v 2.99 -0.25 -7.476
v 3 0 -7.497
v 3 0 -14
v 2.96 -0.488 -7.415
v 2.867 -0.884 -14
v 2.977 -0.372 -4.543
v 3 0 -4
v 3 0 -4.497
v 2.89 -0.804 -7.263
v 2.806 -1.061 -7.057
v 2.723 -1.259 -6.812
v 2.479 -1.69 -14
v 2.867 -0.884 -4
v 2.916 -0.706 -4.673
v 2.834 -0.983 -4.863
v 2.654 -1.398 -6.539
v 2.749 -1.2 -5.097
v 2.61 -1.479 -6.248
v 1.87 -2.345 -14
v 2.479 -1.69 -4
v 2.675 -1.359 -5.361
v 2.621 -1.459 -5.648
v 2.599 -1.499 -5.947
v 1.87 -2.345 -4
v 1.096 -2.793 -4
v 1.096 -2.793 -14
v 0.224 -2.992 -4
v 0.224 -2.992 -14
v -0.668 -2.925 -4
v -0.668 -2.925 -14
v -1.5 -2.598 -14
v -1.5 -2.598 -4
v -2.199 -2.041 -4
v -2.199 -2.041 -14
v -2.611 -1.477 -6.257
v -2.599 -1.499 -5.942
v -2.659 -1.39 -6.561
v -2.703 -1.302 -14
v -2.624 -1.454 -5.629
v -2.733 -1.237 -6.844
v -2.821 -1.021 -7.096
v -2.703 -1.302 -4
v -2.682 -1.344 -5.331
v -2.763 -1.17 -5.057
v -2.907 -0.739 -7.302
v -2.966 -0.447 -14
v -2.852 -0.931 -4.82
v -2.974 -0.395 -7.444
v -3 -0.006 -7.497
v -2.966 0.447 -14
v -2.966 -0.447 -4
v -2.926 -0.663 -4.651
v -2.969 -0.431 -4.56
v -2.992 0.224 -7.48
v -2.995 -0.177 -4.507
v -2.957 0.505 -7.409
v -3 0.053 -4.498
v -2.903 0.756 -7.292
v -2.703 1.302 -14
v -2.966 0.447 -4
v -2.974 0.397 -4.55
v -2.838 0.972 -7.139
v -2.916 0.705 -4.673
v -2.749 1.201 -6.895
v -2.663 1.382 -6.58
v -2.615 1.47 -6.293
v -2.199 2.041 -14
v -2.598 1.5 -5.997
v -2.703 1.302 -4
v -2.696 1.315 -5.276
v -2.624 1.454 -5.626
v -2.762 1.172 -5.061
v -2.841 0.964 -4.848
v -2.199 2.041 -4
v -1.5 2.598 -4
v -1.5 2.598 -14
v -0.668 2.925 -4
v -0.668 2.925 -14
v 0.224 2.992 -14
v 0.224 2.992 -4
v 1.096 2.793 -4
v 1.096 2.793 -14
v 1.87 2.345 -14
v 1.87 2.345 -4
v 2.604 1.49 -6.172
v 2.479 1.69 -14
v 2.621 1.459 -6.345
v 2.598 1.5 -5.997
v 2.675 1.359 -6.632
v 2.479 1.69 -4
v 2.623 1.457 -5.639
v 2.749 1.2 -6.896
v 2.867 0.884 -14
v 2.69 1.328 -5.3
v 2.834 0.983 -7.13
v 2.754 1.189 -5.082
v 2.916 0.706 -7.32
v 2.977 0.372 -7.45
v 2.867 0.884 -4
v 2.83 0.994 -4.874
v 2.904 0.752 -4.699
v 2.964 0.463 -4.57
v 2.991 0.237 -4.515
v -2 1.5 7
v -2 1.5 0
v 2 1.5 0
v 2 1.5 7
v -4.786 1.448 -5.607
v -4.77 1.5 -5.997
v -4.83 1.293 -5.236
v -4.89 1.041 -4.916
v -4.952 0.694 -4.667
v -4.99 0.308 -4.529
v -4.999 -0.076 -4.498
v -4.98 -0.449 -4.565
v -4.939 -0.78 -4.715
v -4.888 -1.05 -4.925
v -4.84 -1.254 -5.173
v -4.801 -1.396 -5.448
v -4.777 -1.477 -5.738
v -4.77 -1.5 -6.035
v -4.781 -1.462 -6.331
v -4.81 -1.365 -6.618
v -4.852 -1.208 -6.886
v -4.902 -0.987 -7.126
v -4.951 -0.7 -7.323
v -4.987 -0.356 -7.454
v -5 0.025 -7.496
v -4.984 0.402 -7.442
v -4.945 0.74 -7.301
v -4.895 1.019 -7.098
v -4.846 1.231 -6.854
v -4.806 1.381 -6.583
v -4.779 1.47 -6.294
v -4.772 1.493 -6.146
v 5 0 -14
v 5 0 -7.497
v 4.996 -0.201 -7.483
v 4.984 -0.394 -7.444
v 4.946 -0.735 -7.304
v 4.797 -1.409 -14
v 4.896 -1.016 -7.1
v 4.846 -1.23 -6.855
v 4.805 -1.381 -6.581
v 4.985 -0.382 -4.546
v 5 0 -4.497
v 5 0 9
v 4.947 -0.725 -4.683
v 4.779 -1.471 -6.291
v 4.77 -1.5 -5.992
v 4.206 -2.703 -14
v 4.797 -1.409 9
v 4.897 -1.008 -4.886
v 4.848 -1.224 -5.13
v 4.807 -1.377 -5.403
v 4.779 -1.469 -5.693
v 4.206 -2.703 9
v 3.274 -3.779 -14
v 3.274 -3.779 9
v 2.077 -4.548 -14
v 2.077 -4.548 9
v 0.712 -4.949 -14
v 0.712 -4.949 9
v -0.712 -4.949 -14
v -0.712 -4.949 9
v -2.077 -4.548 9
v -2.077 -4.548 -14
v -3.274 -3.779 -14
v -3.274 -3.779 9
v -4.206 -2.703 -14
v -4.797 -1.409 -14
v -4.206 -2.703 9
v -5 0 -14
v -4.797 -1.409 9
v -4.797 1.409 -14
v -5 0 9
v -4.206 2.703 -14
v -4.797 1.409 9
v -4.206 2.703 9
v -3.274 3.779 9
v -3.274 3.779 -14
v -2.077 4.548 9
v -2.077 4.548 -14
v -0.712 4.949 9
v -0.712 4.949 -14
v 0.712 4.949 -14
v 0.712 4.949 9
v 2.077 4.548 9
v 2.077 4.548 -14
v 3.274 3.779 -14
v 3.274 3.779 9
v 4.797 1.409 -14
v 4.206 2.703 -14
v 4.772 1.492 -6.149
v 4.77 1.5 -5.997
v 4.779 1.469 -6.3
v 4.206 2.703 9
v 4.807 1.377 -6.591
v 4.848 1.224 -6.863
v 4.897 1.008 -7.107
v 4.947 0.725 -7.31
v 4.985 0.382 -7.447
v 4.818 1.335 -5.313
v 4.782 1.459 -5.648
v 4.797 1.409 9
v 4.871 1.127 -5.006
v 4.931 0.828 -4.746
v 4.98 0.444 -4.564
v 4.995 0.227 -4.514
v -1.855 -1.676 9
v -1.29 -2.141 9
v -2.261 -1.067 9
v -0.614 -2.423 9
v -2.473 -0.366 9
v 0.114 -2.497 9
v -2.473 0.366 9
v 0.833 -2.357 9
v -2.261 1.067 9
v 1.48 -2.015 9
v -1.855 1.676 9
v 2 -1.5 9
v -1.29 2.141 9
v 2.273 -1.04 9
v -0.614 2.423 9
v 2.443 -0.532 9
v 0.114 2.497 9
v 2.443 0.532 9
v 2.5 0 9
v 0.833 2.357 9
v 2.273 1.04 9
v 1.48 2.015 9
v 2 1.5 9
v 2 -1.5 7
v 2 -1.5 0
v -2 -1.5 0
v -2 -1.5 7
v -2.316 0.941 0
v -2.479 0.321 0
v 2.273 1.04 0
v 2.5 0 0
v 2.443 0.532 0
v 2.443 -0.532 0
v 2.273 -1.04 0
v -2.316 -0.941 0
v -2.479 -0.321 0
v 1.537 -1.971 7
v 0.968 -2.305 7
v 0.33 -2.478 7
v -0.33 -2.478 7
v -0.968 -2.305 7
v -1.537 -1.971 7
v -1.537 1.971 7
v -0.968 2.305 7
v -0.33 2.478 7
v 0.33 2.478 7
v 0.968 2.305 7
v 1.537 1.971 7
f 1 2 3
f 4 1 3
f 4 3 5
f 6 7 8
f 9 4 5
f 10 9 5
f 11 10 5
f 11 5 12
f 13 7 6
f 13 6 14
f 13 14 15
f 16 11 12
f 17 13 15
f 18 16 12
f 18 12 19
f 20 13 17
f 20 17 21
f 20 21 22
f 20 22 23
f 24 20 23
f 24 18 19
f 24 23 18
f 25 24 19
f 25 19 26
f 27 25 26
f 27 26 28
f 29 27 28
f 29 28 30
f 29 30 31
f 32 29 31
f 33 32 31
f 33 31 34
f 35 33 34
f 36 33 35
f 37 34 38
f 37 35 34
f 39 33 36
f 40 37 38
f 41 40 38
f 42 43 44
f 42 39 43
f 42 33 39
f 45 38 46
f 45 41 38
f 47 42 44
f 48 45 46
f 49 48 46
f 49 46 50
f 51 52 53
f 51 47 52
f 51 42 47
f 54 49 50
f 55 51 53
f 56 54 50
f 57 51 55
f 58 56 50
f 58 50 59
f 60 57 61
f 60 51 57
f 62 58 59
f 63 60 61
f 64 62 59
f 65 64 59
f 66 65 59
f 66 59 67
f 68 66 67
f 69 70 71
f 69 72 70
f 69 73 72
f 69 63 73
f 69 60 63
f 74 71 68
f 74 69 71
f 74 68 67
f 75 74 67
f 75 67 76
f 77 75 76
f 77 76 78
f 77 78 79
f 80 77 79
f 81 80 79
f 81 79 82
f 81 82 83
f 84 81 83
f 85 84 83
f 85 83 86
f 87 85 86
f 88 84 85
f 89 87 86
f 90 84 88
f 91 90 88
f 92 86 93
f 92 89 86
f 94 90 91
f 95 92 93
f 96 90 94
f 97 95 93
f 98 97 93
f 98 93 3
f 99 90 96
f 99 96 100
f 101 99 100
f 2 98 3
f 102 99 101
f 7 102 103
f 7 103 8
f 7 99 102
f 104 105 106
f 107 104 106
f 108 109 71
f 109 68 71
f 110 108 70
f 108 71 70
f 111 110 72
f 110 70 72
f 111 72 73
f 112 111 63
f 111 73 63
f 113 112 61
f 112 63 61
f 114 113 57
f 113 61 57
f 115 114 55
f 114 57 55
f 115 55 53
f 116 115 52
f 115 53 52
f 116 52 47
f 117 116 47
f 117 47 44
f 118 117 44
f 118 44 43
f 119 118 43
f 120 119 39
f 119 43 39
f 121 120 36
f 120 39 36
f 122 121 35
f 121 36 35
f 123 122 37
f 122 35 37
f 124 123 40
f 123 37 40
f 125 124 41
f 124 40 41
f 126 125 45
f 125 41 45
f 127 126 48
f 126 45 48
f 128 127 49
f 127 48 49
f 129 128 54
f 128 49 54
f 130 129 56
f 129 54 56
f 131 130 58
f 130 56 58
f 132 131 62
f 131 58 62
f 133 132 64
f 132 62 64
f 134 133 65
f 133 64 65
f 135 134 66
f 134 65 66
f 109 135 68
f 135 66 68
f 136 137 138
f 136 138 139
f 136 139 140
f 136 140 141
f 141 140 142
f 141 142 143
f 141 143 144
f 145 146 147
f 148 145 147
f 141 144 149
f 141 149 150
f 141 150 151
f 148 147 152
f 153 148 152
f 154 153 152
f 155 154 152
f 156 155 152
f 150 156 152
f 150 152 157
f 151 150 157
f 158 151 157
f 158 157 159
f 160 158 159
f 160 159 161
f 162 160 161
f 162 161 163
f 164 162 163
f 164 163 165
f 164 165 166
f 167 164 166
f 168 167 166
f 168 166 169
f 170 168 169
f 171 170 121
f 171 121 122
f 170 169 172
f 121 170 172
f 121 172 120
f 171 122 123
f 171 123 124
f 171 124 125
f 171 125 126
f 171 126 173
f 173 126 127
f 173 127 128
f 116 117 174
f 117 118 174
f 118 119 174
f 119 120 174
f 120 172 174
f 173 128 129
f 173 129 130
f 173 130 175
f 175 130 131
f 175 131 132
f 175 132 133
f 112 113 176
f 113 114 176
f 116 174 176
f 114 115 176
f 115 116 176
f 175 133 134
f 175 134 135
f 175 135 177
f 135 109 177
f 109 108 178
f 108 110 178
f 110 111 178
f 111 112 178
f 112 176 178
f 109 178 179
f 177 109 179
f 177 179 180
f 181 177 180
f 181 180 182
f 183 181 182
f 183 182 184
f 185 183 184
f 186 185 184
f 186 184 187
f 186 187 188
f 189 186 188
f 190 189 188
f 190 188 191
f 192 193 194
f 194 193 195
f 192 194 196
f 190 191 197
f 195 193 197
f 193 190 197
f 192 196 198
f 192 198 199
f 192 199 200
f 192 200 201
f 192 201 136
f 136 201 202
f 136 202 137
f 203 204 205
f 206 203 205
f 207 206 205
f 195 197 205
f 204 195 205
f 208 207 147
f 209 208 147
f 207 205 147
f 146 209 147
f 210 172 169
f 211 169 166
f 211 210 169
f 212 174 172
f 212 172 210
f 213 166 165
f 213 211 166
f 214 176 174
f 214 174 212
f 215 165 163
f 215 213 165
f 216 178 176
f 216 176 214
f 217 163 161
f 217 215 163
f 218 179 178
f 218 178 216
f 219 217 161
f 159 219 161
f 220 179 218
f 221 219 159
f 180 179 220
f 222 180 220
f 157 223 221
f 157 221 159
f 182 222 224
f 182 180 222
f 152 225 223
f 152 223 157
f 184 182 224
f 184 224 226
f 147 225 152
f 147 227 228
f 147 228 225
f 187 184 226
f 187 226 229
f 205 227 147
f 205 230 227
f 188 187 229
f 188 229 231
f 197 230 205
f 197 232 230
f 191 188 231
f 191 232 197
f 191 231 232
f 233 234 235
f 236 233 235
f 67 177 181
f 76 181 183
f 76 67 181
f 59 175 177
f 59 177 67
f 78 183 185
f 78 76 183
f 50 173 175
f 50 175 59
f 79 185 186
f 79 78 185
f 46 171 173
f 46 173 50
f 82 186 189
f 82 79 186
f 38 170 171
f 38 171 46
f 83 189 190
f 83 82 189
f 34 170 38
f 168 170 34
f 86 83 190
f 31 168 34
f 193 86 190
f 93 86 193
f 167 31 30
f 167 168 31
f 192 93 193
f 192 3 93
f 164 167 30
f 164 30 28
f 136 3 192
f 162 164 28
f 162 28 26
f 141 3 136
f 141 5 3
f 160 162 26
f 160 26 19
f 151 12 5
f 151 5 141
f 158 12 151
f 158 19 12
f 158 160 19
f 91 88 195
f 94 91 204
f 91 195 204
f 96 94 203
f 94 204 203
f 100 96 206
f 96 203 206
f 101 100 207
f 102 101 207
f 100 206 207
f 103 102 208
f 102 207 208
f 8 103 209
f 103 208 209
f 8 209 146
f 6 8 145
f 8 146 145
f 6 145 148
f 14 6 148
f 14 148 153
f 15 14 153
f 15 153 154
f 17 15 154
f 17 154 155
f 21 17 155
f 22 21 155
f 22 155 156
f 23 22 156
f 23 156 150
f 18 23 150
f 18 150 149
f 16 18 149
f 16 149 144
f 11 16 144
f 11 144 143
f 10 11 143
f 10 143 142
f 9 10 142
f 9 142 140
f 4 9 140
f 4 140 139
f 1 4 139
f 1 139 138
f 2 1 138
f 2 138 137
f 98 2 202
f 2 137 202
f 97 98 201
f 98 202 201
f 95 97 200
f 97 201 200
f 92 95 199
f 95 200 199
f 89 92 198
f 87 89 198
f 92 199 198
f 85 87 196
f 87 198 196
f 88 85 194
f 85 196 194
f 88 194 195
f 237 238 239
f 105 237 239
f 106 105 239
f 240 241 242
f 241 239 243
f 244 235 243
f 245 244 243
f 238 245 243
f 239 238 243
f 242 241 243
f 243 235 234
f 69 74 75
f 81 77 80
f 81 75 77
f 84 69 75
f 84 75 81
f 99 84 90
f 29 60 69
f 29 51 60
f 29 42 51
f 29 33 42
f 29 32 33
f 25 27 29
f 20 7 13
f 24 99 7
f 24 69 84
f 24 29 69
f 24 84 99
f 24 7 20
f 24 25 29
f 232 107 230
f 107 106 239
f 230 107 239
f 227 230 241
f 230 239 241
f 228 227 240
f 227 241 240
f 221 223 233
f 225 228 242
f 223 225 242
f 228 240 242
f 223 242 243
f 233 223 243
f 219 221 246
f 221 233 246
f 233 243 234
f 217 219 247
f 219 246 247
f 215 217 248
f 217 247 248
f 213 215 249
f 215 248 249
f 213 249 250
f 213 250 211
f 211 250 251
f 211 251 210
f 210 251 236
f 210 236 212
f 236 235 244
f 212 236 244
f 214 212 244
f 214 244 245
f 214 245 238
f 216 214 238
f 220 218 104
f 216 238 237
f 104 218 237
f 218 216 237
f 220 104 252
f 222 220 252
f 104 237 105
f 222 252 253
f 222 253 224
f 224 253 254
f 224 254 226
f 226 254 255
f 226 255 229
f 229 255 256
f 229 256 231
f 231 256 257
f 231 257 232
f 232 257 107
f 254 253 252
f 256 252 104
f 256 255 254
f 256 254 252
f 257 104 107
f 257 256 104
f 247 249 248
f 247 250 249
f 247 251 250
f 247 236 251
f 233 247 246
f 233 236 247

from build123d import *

# Parameters (mm, degrees)
F0_R     = 5
F1_DEPTH = 7
F2_DEPTH = 9
F3_R     = 5
F3_R_2   = 3
F4_DEPTH = 4
F5_DEPTH = 14
F6_R     = 1.5
F7_DEPTH = 12.5


with BuildPart() as f1:
    # F0 (on Top) → F1 (new body)
    with BuildSketch(Plane.XY):
        Circle(F0_R)
        with BuildLine():
            ThreePointArc((-2, 1.5), (0, 2.5), (2, 1.5))
            Line((2, 1.5), (3.6073317751, 1.5))
            Line((3.6073317751, 1.5), (3.6073317751, -1.5))
            Line((3.6073317751, -1.5), (2, -1.5))
            ThreePointArc((2, -1.5), (0, -2.5), (-2, -1.5))
            Line((-2, -1.5), (-3.6073317751, -1.5))
            Line((-3.6073317751, -1.5), (-3.6073317751, 1.5))
            Line((-3.6073317751, 1.5), (-2, 1.5))
        make_face(mode=Mode.SUBTRACT)
        with BuildLine():
            ThreePointArc((2, 1.5), (2.3717082451, 0.790569415), (2.5, 0))
            ThreePointArc((2.5, 0), (2.3717082451, -0.790569415), (2, -1.5))
            Line((2, -1.5), (3.6073317751, -1.5))
            Line((3.6073317751, -1.5), (3.6073317751, 1.5))
            Line((3.6073317751, 1.5), (2, 1.5))
        make_face()
        with BuildLine():
            Line((-2, 1.5), (2, 1.5))
            ThreePointArc((2, 1.5), (0, 2.5), (-2, 1.5))
        make_face()
        with BuildLine():
            ThreePointArc((-2, -1.5), (0, -2.5), (2, -1.5))
            Line((2, -1.5), (-2, -1.5))
        make_face()
        with BuildLine():
            ThreePointArc((-2, -1.5), (-2.5, 0), (-2, 1.5))
            Line((-2, 1.5), (-3.6073317751, 1.5))
            Line((-3.6073317751, 1.5), (-3.6073317751, -1.5))
            Line((-3.6073317751, -1.5), (-2, -1.5))
        make_face()
    extrude(amount=F1_DEPTH)

    # F0 (on Top) → F2 (join)
    with BuildSketch(Plane.XY):
        Circle(F0_R)
        with BuildLine():
            ThreePointArc((-2, 1.5), (0, 2.5), (2, 1.5))
            Line((2, 1.5), (3.6073317751, 1.5))
            Line((3.6073317751, 1.5), (3.6073317751, -1.5))
            Line((3.6073317751, -1.5), (2, -1.5))
            ThreePointArc((2, -1.5), (0, -2.5), (-2, -1.5))
            Line((-2, -1.5), (-3.6073317751, -1.5))
            Line((-3.6073317751, -1.5), (-3.6073317751, 1.5))
            Line((-3.6073317751, 1.5), (-2, 1.5))
        make_face(mode=Mode.SUBTRACT)
        with BuildLine():
            ThreePointArc((-2, -1.5), (-2.5, 0), (-2, 1.5))
            Line((-2, 1.5), (-3.6073317751, 1.5))
            Line((-3.6073317751, 1.5), (-3.6073317751, -1.5))
            Line((-3.6073317751, -1.5), (-2, -1.5))
        make_face()
        with BuildLine():
            ThreePointArc((2, 1.5), (2.3717082451, 0.790569415), (2.5, 0))
            ThreePointArc((2.5, 0), (2.3717082451, -0.790569415), (2, -1.5))
            Line((2, -1.5), (3.6073317751, -1.5))
            Line((3.6073317751, -1.5), (3.6073317751, 1.5))
            Line((3.6073317751, 1.5), (2, 1.5))
        make_face()
    extrude(amount=F2_DEPTH)

    # F3 (on face) → F4 (join)
    with BuildSketch(Plane(origin=(0, 0, 0), x_dir=(1, 0, 0), z_dir=(0, 0, -1))):
        Circle(F3_R)
        Circle(F3_R_2, mode=Mode.SUBTRACT)
        Circle(F3_R_2)
        with BuildLine():
            Line((2, -1.5), (-2, -1.5))
            ThreePointArc((-2, -1.5), (-2.5, 0), (-2, 1.5))
            Line((-2, 1.5), (2, 1.5))
            ThreePointArc((2, 1.5), (2.5, 0), (2, -1.5))
        make_face(mode=Mode.SUBTRACT)
        with BuildLine():
            ThreePointArc((-2, 1.5), (-2.5, 0), (-2, -1.5))
            Line((-2, -1.5), (2, -1.5))
            ThreePointArc((2, -1.5), (2.5, 0), (2, 1.5))
            Line((2, 1.5), (-2, 1.5))
        make_face()
    extrude(amount=F4_DEPTH)

    # F3 (on face) → F5 (join)
    with BuildSketch(Plane(origin=(0, 0, 0), x_dir=(1, 0, 0), z_dir=(0, 0, -1))):
        Circle(F3_R)
        Circle(F3_R_2, mode=Mode.SUBTRACT)
    extrude(amount=F5_DEPTH)

    # F6 (on Right) → F7 (cut, symmetric)
    with BuildSketch(Plane.YZ):
        with Locations((0, -5.9965602363)):
            Circle(F6_R)
    extrude(amount=F7_DEPTH, both=True, mode=Mode.SUBTRACT)


solid = f1.part
